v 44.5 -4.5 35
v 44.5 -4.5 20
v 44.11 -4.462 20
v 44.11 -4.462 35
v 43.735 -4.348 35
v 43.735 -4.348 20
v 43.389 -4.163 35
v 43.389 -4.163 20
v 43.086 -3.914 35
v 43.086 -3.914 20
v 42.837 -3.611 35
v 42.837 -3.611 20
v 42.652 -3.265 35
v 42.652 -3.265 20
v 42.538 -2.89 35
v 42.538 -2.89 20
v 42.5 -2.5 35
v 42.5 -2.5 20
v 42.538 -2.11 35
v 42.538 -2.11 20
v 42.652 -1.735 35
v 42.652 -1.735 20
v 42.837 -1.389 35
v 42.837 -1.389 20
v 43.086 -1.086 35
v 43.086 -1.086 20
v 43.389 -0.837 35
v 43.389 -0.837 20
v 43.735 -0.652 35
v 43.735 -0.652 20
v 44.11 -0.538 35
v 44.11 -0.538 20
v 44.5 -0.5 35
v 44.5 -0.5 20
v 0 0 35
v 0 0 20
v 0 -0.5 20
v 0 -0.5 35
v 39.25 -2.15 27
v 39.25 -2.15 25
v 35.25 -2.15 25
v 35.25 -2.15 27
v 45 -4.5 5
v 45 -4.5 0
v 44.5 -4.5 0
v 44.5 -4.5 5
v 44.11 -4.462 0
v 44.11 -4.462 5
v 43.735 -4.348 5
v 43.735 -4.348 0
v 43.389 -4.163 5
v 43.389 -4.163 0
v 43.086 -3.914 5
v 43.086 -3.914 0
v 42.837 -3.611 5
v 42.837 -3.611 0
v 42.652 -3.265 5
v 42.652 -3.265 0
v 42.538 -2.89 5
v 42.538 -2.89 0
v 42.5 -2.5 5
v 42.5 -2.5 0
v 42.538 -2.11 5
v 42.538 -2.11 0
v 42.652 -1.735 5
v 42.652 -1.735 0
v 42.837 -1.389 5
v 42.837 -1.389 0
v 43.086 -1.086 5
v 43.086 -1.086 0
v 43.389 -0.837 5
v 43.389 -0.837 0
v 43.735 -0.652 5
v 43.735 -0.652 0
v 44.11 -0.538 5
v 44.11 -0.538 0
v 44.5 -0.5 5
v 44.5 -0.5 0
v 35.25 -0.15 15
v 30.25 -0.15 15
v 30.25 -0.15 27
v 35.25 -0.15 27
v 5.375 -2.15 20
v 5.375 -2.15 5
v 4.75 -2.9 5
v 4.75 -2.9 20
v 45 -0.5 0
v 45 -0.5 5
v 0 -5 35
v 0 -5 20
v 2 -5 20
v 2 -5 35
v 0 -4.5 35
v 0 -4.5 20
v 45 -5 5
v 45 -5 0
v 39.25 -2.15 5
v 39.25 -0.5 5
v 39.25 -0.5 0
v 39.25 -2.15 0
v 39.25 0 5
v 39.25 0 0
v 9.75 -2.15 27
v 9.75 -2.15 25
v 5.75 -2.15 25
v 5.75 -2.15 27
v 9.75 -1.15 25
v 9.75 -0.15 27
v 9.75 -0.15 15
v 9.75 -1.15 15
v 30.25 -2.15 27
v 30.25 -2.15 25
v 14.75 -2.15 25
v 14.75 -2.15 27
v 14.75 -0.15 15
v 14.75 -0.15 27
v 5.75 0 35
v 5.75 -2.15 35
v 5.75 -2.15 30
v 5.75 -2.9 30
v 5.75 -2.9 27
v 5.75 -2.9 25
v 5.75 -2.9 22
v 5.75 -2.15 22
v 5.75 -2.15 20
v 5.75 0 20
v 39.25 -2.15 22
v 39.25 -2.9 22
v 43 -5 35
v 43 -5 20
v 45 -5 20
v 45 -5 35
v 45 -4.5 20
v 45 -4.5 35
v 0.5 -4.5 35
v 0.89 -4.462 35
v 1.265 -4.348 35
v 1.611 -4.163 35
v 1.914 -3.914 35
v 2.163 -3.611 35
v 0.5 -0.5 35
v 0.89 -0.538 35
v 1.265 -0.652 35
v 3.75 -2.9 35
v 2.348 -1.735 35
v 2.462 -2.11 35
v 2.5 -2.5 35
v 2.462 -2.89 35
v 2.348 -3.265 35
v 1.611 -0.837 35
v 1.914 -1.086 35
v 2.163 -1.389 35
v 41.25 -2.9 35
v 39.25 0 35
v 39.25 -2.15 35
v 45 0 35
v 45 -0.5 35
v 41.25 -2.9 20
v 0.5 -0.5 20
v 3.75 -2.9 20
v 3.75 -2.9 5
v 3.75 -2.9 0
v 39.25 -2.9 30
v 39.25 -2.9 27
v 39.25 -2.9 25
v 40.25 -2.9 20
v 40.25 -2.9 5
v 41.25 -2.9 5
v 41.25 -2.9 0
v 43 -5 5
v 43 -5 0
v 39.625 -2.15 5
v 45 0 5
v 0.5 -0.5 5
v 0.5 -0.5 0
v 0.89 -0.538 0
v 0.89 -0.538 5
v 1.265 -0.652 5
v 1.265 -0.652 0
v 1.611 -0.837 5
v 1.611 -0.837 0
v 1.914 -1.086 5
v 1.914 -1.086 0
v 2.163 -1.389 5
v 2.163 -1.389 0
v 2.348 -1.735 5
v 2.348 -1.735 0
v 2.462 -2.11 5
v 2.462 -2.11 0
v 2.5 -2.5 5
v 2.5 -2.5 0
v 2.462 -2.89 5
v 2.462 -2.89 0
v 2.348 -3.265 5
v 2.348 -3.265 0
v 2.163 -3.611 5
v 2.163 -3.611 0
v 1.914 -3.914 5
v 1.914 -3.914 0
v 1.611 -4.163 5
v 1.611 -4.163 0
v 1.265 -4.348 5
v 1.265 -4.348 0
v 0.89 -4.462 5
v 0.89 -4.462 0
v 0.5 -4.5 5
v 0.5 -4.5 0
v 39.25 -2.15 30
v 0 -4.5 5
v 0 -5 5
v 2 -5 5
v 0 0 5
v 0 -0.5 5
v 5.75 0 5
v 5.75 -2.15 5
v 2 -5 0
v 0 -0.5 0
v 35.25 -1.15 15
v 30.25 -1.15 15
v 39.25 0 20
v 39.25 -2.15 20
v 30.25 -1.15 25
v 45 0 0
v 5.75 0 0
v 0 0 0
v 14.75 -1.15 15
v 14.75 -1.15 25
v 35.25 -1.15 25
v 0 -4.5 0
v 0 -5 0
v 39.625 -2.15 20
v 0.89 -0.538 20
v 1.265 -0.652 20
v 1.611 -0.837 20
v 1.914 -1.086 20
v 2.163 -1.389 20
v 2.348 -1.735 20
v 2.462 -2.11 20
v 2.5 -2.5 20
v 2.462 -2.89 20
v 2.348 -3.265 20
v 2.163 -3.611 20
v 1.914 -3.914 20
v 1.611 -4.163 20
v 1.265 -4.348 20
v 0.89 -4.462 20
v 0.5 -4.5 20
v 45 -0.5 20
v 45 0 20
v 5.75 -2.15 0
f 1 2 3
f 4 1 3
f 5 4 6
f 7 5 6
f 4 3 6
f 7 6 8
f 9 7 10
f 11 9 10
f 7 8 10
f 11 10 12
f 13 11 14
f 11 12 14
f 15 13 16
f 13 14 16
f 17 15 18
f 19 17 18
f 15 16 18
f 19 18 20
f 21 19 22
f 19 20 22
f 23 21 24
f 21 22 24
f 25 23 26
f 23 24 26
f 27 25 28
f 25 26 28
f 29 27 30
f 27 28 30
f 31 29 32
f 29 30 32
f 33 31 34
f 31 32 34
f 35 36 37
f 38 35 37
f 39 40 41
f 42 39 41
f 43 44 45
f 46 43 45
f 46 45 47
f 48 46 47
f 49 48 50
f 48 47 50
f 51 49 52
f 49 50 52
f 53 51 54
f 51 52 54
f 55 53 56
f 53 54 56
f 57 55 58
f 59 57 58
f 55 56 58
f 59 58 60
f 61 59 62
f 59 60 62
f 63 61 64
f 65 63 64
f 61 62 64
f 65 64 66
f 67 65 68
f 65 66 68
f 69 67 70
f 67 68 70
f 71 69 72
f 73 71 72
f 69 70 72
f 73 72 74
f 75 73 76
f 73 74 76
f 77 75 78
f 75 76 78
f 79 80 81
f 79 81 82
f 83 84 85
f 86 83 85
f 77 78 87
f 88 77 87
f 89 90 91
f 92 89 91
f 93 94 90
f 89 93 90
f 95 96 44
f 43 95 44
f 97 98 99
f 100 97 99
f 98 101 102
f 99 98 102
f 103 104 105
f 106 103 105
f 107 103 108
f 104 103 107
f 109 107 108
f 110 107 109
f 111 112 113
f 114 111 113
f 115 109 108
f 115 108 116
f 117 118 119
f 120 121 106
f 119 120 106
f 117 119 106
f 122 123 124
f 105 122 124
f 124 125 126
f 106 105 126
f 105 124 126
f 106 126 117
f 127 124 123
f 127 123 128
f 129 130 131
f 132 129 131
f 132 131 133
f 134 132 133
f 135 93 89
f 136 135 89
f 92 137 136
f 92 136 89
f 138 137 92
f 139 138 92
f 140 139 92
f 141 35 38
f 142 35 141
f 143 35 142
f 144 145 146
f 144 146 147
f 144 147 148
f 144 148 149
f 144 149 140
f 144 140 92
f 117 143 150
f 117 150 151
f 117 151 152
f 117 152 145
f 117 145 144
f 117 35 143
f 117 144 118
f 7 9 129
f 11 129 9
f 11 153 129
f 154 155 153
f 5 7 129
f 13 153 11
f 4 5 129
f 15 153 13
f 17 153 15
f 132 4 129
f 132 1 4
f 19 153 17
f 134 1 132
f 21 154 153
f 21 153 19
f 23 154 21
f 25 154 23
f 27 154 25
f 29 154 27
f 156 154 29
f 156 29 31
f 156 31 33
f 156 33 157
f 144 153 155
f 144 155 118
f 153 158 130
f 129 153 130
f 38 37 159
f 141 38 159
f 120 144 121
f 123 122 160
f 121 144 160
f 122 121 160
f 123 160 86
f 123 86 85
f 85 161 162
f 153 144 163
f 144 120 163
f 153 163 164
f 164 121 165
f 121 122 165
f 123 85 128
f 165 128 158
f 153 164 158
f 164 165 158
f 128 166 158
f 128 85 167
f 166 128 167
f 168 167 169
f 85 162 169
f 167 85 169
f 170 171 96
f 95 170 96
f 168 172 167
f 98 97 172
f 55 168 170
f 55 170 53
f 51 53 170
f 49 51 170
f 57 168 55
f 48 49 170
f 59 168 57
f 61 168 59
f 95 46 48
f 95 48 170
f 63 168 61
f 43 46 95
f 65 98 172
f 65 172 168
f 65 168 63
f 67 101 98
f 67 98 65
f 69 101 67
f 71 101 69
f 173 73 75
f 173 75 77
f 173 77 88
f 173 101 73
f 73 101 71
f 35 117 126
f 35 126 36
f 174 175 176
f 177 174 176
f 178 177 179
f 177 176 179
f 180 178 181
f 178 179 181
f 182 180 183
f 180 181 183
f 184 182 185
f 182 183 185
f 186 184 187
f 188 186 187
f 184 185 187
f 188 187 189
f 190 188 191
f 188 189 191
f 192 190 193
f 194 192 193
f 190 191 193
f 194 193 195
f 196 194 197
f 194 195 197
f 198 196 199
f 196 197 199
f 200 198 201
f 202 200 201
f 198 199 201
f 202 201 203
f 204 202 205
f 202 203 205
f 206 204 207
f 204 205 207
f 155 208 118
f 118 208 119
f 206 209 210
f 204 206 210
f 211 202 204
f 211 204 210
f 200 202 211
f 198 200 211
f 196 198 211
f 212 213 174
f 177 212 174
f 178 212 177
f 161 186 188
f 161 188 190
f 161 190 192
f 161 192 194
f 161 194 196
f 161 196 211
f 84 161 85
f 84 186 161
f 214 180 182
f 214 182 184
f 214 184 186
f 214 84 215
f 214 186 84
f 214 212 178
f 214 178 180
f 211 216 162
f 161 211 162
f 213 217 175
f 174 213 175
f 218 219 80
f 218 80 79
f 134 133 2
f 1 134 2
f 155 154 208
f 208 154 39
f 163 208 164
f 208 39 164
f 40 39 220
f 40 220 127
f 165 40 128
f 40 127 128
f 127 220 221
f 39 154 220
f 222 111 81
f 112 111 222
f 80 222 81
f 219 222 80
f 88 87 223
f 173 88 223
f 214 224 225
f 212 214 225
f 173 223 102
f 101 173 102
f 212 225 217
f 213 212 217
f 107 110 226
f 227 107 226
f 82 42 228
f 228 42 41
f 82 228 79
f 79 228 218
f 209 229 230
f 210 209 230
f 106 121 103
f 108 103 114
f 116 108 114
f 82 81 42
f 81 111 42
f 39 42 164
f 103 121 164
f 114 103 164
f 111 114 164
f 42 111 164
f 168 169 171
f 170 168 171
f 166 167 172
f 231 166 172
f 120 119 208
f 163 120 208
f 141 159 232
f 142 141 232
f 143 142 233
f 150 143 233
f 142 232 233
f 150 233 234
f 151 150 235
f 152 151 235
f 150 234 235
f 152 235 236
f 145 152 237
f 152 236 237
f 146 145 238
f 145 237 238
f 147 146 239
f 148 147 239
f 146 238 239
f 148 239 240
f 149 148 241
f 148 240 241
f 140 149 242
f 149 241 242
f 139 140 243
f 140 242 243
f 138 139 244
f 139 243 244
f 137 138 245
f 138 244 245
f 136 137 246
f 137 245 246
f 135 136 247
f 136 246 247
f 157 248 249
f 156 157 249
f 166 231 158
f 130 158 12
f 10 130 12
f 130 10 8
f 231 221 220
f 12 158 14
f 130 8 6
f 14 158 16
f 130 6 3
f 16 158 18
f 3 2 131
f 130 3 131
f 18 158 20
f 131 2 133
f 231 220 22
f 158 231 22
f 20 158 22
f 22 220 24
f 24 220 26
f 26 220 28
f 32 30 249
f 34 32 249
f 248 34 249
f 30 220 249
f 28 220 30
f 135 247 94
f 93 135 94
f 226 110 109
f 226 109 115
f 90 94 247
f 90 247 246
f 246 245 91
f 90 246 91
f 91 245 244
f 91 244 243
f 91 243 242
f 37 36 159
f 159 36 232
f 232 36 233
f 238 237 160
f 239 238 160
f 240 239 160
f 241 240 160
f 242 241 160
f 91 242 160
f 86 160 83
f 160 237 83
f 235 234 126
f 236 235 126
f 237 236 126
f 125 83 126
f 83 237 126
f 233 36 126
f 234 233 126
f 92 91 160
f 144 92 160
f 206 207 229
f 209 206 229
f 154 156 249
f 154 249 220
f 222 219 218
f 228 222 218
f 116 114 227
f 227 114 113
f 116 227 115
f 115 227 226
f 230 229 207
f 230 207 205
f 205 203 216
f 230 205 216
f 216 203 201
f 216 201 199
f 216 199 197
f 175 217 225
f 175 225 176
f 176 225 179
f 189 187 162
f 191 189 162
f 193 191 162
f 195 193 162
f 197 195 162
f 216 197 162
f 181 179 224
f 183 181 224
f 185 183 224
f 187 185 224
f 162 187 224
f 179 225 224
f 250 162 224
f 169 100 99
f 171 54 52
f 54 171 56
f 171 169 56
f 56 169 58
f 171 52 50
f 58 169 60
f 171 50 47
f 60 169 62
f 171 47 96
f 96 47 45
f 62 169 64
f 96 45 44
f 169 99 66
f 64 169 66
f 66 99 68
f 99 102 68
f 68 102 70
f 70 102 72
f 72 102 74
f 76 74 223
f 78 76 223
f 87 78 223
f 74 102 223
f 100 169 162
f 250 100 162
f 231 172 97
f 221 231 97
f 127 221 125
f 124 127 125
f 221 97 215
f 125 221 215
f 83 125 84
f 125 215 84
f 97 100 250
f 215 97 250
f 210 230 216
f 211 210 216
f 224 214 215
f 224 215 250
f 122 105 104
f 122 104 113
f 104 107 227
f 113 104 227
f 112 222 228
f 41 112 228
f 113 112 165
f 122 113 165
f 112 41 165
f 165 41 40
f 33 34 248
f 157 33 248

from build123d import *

# Parameters (mm, degrees)
BOSS_EXTRU_1_DEPTH      = 5
BOSS_EXTRU_2_DEPTH      = 15
BOSS_EXTRU_3_DEPTH      = 15
ESQUISSE5_W             = 2.4467389
ESQUISSE5_H             = 15
ESQUISSE5_W_2           = 2.875
ESQUISSE5_W_3           = 2.123659042
ESQUISSE5_H_2           = 5
ESQUISSE5_W_4           = 1.985062281
BOSS_EXTRU_4_DEPTH      = 2.5
ESQUISSE6_W             = 33.5
ESQUISSE6_H             = 3
ENL_V_MAT_EXTRU_1_DEPTH = 2.5
ESQUISSE8_W             = 5
ESQUISSE8_H             = 2
BOSS_EXTRU_5_DEPTH      = 1
ESQUISSE9_W             = 5
ESQUISSE9_H             = 12
BOSS_EXTRU_6_DEPTH      = 1


with BuildPart() as part:
    # Esquisse1 → Boss.-Extru.1 (new body)
    with BuildSketch(Plane.XY):
        with BuildLine():
            Line((0.5, -4.5), (0, -4.5))
            Line((0, -4.5), (0, -5))
            Line((0, -5), (0.5, -5))
            Line((0.5, -5), (2, -5))
            Line((2, -5), (3.75, -2.9))
            Line((3.75, -2.9), (41.25, -2.9))
            Line((41.25, -2.9), (43, -5))
            Line((43, -5), (44.5, -5))
            Line((44.5, -5), (45, -5))
            Line((45, -5), (45, -4.5))
            Line((45, -4.5), (44.5, -4.5))
            ThreePointArc((44.5, -4.5), (42.5, -2.5), (44.5, -0.5))
            Line((44.5, -0.5), (45, -0.5))
            Line((45, -0.5), (45, 0))
            Line((45, 0), (44.5, 0))
            Line((44.5, 0), (39.25, 0))
            Line((39.25, 0), (39.25, -0.5))
            Line((39.25, -0.5), (40.625, -2.15))
            Line((40.625, -2.15), (4.375, -2.15))
            Line((4.375, -2.15), (5.75, -0.5))
            Line((5.75, -0.5), (5.75, 0))
            Line((5.75, 0), (0, 0))
            Line((0, 0), (0, -0.5))
            Line((0, -0.5), (0.5, -0.5))
            ThreePointArc((0.5, -0.5), (2.5, -2.5), (0.5, -4.5))
        make_face()
    extrude(amount=BOSS_EXTRU_1_DEPTH)

    # Esquisse3 → Boss.-Extru.2 (add)
    with BuildSketch(Plane.XY.offset(5)):
        Polygon((40.25, -2.9), (39.625, -2.15), (5.375, -2.15), (4.75, -2.9), align=None)
    extrude(amount=BOSS_EXTRU_2_DEPTH)

    # Esquisse4 → Boss.-Extru.3 (add)
    with BuildSketch(Plane.XY.offset(20)):
        with BuildLine():
            Line((0.5, -4.5), (0, -4.5))
            Line((0, -4.5), (0, -5))
            Line((0, -5), (0.5, -5))
            Line((0.5, -5), (2, -5))
            Line((2, -5), (3.75, -2.9))
            Line((3.75, -2.9), (41.25, -2.9))
            Line((41.25, -2.9), (43, -5))
            Line((43, -5), (44.5, -5))
            Line((44.5, -5), (45, -5))
            Line((45, -5), (45, -4.5))
            Line((45, -4.5), (44.5, -4.5))
            ThreePointArc((44.5, -4.5), (42.5, -2.5), (44.5, -0.5))
            Line((44.5, -0.5), (45, -0.5))
            Line((45, -0.5), (45, 0))
            Line((45, 0), (43.697090933, 0))
            Line((43.697090933, 0), (39.25, 0))
            Line((39.25, 0), (39.25, -0.5))
            Line((39.25, -0.5), (40.625, -2.15))
            Line((40.625, -2.15), (4.375, -2.15))
            Line((4.375, -2.15), (5.75, -0.5))
            Line((5.75, -0.5), (5.75, 0))
            Line((5.75, 0), (0, 0))
            Line((0, 0), (0, -0.5))
            Line((0, -0.5), (0.5, -0.5))
            ThreePointArc((0.5, -0.5), (2.5, -2.5), (0.5, -4.5))
        make_face()
    extrude(amount=BOSS_EXTRU_3_DEPTH)

    # Esquisse5 → Boss.-Extru.4 (add)
    with BuildSketch(Plane(origin=(0, 0, 0), x_dir=(1, 0, 0), z_dir=(0, 1, 0))):
        with Locations((40.47336945, -27.5)):
            Rectangle(ESQUISSE5_W, ESQUISSE5_H)
        with Locations((4.3125, -27.5)):
            Rectangle(ESQUISSE5_W_2, ESQUISSE5_H)
        with Locations((4.688170479, -2.5)):
            Rectangle(ESQUISSE5_W_3, ESQUISSE5_H_2)
        with Locations((40.242531141, -2.5)):
            Rectangle(ESQUISSE5_W_4, ESQUISSE5_H_2)
    extrude(amount=-BOSS_EXTRU_4_DEPTH)

    # Esquisse6 → Enlèv. mat.-Extru.1 (cut)
    with BuildSketch(Plane(origin=(0, -2.15, 0), x_dir=(1, 0, 0), z_dir=(0, 1, 0))):
        with Locations((22.5, -28.5)):
            Rectangle(ESQUISSE6_W, ESQUISSE6_H)
        with Locations((22.5, -23.5)):
            Rectangle(ESQUISSE6_W, ESQUISSE6_H)
    extrude(amount=-ENL_V_MAT_EXTRU_1_DEPTH, mode=Mode.SUBTRACT)

    # Esquisse8 → Boss.-Extru.5 (add)
    with BuildSketch(Plane(origin=(0, -2.15, 0), x_dir=(1, 0, 0), z_dir=(0, 1, 0))):
        with Locations((32.75, -26)):
            Rectangle(ESQUISSE8_W, ESQUISSE8_H)
        with Locations((12.25, -26)):
            Rectangle(ESQUISSE8_W, ESQUISSE8_H)
    extrude(amount=BOSS_EXTRU_5_DEPTH)

    # Esquisse9 → Boss.-Extru.6 (add)
    with BuildSketch(Plane(origin=(0, -1.15, 0), x_dir=(1, 0, 0), z_dir=(0, 1, 0))):
        with Locations((32.75, -21)):
            Rectangle(ESQUISSE9_W, ESQUISSE9_H)
        with Locations((12.25, -21)):
            Rectangle(ESQUISSE9_W, ESQUISSE9_H)
    extrude(amount=BOSS_EXTRU_6_DEPTH)


solid = part.part
